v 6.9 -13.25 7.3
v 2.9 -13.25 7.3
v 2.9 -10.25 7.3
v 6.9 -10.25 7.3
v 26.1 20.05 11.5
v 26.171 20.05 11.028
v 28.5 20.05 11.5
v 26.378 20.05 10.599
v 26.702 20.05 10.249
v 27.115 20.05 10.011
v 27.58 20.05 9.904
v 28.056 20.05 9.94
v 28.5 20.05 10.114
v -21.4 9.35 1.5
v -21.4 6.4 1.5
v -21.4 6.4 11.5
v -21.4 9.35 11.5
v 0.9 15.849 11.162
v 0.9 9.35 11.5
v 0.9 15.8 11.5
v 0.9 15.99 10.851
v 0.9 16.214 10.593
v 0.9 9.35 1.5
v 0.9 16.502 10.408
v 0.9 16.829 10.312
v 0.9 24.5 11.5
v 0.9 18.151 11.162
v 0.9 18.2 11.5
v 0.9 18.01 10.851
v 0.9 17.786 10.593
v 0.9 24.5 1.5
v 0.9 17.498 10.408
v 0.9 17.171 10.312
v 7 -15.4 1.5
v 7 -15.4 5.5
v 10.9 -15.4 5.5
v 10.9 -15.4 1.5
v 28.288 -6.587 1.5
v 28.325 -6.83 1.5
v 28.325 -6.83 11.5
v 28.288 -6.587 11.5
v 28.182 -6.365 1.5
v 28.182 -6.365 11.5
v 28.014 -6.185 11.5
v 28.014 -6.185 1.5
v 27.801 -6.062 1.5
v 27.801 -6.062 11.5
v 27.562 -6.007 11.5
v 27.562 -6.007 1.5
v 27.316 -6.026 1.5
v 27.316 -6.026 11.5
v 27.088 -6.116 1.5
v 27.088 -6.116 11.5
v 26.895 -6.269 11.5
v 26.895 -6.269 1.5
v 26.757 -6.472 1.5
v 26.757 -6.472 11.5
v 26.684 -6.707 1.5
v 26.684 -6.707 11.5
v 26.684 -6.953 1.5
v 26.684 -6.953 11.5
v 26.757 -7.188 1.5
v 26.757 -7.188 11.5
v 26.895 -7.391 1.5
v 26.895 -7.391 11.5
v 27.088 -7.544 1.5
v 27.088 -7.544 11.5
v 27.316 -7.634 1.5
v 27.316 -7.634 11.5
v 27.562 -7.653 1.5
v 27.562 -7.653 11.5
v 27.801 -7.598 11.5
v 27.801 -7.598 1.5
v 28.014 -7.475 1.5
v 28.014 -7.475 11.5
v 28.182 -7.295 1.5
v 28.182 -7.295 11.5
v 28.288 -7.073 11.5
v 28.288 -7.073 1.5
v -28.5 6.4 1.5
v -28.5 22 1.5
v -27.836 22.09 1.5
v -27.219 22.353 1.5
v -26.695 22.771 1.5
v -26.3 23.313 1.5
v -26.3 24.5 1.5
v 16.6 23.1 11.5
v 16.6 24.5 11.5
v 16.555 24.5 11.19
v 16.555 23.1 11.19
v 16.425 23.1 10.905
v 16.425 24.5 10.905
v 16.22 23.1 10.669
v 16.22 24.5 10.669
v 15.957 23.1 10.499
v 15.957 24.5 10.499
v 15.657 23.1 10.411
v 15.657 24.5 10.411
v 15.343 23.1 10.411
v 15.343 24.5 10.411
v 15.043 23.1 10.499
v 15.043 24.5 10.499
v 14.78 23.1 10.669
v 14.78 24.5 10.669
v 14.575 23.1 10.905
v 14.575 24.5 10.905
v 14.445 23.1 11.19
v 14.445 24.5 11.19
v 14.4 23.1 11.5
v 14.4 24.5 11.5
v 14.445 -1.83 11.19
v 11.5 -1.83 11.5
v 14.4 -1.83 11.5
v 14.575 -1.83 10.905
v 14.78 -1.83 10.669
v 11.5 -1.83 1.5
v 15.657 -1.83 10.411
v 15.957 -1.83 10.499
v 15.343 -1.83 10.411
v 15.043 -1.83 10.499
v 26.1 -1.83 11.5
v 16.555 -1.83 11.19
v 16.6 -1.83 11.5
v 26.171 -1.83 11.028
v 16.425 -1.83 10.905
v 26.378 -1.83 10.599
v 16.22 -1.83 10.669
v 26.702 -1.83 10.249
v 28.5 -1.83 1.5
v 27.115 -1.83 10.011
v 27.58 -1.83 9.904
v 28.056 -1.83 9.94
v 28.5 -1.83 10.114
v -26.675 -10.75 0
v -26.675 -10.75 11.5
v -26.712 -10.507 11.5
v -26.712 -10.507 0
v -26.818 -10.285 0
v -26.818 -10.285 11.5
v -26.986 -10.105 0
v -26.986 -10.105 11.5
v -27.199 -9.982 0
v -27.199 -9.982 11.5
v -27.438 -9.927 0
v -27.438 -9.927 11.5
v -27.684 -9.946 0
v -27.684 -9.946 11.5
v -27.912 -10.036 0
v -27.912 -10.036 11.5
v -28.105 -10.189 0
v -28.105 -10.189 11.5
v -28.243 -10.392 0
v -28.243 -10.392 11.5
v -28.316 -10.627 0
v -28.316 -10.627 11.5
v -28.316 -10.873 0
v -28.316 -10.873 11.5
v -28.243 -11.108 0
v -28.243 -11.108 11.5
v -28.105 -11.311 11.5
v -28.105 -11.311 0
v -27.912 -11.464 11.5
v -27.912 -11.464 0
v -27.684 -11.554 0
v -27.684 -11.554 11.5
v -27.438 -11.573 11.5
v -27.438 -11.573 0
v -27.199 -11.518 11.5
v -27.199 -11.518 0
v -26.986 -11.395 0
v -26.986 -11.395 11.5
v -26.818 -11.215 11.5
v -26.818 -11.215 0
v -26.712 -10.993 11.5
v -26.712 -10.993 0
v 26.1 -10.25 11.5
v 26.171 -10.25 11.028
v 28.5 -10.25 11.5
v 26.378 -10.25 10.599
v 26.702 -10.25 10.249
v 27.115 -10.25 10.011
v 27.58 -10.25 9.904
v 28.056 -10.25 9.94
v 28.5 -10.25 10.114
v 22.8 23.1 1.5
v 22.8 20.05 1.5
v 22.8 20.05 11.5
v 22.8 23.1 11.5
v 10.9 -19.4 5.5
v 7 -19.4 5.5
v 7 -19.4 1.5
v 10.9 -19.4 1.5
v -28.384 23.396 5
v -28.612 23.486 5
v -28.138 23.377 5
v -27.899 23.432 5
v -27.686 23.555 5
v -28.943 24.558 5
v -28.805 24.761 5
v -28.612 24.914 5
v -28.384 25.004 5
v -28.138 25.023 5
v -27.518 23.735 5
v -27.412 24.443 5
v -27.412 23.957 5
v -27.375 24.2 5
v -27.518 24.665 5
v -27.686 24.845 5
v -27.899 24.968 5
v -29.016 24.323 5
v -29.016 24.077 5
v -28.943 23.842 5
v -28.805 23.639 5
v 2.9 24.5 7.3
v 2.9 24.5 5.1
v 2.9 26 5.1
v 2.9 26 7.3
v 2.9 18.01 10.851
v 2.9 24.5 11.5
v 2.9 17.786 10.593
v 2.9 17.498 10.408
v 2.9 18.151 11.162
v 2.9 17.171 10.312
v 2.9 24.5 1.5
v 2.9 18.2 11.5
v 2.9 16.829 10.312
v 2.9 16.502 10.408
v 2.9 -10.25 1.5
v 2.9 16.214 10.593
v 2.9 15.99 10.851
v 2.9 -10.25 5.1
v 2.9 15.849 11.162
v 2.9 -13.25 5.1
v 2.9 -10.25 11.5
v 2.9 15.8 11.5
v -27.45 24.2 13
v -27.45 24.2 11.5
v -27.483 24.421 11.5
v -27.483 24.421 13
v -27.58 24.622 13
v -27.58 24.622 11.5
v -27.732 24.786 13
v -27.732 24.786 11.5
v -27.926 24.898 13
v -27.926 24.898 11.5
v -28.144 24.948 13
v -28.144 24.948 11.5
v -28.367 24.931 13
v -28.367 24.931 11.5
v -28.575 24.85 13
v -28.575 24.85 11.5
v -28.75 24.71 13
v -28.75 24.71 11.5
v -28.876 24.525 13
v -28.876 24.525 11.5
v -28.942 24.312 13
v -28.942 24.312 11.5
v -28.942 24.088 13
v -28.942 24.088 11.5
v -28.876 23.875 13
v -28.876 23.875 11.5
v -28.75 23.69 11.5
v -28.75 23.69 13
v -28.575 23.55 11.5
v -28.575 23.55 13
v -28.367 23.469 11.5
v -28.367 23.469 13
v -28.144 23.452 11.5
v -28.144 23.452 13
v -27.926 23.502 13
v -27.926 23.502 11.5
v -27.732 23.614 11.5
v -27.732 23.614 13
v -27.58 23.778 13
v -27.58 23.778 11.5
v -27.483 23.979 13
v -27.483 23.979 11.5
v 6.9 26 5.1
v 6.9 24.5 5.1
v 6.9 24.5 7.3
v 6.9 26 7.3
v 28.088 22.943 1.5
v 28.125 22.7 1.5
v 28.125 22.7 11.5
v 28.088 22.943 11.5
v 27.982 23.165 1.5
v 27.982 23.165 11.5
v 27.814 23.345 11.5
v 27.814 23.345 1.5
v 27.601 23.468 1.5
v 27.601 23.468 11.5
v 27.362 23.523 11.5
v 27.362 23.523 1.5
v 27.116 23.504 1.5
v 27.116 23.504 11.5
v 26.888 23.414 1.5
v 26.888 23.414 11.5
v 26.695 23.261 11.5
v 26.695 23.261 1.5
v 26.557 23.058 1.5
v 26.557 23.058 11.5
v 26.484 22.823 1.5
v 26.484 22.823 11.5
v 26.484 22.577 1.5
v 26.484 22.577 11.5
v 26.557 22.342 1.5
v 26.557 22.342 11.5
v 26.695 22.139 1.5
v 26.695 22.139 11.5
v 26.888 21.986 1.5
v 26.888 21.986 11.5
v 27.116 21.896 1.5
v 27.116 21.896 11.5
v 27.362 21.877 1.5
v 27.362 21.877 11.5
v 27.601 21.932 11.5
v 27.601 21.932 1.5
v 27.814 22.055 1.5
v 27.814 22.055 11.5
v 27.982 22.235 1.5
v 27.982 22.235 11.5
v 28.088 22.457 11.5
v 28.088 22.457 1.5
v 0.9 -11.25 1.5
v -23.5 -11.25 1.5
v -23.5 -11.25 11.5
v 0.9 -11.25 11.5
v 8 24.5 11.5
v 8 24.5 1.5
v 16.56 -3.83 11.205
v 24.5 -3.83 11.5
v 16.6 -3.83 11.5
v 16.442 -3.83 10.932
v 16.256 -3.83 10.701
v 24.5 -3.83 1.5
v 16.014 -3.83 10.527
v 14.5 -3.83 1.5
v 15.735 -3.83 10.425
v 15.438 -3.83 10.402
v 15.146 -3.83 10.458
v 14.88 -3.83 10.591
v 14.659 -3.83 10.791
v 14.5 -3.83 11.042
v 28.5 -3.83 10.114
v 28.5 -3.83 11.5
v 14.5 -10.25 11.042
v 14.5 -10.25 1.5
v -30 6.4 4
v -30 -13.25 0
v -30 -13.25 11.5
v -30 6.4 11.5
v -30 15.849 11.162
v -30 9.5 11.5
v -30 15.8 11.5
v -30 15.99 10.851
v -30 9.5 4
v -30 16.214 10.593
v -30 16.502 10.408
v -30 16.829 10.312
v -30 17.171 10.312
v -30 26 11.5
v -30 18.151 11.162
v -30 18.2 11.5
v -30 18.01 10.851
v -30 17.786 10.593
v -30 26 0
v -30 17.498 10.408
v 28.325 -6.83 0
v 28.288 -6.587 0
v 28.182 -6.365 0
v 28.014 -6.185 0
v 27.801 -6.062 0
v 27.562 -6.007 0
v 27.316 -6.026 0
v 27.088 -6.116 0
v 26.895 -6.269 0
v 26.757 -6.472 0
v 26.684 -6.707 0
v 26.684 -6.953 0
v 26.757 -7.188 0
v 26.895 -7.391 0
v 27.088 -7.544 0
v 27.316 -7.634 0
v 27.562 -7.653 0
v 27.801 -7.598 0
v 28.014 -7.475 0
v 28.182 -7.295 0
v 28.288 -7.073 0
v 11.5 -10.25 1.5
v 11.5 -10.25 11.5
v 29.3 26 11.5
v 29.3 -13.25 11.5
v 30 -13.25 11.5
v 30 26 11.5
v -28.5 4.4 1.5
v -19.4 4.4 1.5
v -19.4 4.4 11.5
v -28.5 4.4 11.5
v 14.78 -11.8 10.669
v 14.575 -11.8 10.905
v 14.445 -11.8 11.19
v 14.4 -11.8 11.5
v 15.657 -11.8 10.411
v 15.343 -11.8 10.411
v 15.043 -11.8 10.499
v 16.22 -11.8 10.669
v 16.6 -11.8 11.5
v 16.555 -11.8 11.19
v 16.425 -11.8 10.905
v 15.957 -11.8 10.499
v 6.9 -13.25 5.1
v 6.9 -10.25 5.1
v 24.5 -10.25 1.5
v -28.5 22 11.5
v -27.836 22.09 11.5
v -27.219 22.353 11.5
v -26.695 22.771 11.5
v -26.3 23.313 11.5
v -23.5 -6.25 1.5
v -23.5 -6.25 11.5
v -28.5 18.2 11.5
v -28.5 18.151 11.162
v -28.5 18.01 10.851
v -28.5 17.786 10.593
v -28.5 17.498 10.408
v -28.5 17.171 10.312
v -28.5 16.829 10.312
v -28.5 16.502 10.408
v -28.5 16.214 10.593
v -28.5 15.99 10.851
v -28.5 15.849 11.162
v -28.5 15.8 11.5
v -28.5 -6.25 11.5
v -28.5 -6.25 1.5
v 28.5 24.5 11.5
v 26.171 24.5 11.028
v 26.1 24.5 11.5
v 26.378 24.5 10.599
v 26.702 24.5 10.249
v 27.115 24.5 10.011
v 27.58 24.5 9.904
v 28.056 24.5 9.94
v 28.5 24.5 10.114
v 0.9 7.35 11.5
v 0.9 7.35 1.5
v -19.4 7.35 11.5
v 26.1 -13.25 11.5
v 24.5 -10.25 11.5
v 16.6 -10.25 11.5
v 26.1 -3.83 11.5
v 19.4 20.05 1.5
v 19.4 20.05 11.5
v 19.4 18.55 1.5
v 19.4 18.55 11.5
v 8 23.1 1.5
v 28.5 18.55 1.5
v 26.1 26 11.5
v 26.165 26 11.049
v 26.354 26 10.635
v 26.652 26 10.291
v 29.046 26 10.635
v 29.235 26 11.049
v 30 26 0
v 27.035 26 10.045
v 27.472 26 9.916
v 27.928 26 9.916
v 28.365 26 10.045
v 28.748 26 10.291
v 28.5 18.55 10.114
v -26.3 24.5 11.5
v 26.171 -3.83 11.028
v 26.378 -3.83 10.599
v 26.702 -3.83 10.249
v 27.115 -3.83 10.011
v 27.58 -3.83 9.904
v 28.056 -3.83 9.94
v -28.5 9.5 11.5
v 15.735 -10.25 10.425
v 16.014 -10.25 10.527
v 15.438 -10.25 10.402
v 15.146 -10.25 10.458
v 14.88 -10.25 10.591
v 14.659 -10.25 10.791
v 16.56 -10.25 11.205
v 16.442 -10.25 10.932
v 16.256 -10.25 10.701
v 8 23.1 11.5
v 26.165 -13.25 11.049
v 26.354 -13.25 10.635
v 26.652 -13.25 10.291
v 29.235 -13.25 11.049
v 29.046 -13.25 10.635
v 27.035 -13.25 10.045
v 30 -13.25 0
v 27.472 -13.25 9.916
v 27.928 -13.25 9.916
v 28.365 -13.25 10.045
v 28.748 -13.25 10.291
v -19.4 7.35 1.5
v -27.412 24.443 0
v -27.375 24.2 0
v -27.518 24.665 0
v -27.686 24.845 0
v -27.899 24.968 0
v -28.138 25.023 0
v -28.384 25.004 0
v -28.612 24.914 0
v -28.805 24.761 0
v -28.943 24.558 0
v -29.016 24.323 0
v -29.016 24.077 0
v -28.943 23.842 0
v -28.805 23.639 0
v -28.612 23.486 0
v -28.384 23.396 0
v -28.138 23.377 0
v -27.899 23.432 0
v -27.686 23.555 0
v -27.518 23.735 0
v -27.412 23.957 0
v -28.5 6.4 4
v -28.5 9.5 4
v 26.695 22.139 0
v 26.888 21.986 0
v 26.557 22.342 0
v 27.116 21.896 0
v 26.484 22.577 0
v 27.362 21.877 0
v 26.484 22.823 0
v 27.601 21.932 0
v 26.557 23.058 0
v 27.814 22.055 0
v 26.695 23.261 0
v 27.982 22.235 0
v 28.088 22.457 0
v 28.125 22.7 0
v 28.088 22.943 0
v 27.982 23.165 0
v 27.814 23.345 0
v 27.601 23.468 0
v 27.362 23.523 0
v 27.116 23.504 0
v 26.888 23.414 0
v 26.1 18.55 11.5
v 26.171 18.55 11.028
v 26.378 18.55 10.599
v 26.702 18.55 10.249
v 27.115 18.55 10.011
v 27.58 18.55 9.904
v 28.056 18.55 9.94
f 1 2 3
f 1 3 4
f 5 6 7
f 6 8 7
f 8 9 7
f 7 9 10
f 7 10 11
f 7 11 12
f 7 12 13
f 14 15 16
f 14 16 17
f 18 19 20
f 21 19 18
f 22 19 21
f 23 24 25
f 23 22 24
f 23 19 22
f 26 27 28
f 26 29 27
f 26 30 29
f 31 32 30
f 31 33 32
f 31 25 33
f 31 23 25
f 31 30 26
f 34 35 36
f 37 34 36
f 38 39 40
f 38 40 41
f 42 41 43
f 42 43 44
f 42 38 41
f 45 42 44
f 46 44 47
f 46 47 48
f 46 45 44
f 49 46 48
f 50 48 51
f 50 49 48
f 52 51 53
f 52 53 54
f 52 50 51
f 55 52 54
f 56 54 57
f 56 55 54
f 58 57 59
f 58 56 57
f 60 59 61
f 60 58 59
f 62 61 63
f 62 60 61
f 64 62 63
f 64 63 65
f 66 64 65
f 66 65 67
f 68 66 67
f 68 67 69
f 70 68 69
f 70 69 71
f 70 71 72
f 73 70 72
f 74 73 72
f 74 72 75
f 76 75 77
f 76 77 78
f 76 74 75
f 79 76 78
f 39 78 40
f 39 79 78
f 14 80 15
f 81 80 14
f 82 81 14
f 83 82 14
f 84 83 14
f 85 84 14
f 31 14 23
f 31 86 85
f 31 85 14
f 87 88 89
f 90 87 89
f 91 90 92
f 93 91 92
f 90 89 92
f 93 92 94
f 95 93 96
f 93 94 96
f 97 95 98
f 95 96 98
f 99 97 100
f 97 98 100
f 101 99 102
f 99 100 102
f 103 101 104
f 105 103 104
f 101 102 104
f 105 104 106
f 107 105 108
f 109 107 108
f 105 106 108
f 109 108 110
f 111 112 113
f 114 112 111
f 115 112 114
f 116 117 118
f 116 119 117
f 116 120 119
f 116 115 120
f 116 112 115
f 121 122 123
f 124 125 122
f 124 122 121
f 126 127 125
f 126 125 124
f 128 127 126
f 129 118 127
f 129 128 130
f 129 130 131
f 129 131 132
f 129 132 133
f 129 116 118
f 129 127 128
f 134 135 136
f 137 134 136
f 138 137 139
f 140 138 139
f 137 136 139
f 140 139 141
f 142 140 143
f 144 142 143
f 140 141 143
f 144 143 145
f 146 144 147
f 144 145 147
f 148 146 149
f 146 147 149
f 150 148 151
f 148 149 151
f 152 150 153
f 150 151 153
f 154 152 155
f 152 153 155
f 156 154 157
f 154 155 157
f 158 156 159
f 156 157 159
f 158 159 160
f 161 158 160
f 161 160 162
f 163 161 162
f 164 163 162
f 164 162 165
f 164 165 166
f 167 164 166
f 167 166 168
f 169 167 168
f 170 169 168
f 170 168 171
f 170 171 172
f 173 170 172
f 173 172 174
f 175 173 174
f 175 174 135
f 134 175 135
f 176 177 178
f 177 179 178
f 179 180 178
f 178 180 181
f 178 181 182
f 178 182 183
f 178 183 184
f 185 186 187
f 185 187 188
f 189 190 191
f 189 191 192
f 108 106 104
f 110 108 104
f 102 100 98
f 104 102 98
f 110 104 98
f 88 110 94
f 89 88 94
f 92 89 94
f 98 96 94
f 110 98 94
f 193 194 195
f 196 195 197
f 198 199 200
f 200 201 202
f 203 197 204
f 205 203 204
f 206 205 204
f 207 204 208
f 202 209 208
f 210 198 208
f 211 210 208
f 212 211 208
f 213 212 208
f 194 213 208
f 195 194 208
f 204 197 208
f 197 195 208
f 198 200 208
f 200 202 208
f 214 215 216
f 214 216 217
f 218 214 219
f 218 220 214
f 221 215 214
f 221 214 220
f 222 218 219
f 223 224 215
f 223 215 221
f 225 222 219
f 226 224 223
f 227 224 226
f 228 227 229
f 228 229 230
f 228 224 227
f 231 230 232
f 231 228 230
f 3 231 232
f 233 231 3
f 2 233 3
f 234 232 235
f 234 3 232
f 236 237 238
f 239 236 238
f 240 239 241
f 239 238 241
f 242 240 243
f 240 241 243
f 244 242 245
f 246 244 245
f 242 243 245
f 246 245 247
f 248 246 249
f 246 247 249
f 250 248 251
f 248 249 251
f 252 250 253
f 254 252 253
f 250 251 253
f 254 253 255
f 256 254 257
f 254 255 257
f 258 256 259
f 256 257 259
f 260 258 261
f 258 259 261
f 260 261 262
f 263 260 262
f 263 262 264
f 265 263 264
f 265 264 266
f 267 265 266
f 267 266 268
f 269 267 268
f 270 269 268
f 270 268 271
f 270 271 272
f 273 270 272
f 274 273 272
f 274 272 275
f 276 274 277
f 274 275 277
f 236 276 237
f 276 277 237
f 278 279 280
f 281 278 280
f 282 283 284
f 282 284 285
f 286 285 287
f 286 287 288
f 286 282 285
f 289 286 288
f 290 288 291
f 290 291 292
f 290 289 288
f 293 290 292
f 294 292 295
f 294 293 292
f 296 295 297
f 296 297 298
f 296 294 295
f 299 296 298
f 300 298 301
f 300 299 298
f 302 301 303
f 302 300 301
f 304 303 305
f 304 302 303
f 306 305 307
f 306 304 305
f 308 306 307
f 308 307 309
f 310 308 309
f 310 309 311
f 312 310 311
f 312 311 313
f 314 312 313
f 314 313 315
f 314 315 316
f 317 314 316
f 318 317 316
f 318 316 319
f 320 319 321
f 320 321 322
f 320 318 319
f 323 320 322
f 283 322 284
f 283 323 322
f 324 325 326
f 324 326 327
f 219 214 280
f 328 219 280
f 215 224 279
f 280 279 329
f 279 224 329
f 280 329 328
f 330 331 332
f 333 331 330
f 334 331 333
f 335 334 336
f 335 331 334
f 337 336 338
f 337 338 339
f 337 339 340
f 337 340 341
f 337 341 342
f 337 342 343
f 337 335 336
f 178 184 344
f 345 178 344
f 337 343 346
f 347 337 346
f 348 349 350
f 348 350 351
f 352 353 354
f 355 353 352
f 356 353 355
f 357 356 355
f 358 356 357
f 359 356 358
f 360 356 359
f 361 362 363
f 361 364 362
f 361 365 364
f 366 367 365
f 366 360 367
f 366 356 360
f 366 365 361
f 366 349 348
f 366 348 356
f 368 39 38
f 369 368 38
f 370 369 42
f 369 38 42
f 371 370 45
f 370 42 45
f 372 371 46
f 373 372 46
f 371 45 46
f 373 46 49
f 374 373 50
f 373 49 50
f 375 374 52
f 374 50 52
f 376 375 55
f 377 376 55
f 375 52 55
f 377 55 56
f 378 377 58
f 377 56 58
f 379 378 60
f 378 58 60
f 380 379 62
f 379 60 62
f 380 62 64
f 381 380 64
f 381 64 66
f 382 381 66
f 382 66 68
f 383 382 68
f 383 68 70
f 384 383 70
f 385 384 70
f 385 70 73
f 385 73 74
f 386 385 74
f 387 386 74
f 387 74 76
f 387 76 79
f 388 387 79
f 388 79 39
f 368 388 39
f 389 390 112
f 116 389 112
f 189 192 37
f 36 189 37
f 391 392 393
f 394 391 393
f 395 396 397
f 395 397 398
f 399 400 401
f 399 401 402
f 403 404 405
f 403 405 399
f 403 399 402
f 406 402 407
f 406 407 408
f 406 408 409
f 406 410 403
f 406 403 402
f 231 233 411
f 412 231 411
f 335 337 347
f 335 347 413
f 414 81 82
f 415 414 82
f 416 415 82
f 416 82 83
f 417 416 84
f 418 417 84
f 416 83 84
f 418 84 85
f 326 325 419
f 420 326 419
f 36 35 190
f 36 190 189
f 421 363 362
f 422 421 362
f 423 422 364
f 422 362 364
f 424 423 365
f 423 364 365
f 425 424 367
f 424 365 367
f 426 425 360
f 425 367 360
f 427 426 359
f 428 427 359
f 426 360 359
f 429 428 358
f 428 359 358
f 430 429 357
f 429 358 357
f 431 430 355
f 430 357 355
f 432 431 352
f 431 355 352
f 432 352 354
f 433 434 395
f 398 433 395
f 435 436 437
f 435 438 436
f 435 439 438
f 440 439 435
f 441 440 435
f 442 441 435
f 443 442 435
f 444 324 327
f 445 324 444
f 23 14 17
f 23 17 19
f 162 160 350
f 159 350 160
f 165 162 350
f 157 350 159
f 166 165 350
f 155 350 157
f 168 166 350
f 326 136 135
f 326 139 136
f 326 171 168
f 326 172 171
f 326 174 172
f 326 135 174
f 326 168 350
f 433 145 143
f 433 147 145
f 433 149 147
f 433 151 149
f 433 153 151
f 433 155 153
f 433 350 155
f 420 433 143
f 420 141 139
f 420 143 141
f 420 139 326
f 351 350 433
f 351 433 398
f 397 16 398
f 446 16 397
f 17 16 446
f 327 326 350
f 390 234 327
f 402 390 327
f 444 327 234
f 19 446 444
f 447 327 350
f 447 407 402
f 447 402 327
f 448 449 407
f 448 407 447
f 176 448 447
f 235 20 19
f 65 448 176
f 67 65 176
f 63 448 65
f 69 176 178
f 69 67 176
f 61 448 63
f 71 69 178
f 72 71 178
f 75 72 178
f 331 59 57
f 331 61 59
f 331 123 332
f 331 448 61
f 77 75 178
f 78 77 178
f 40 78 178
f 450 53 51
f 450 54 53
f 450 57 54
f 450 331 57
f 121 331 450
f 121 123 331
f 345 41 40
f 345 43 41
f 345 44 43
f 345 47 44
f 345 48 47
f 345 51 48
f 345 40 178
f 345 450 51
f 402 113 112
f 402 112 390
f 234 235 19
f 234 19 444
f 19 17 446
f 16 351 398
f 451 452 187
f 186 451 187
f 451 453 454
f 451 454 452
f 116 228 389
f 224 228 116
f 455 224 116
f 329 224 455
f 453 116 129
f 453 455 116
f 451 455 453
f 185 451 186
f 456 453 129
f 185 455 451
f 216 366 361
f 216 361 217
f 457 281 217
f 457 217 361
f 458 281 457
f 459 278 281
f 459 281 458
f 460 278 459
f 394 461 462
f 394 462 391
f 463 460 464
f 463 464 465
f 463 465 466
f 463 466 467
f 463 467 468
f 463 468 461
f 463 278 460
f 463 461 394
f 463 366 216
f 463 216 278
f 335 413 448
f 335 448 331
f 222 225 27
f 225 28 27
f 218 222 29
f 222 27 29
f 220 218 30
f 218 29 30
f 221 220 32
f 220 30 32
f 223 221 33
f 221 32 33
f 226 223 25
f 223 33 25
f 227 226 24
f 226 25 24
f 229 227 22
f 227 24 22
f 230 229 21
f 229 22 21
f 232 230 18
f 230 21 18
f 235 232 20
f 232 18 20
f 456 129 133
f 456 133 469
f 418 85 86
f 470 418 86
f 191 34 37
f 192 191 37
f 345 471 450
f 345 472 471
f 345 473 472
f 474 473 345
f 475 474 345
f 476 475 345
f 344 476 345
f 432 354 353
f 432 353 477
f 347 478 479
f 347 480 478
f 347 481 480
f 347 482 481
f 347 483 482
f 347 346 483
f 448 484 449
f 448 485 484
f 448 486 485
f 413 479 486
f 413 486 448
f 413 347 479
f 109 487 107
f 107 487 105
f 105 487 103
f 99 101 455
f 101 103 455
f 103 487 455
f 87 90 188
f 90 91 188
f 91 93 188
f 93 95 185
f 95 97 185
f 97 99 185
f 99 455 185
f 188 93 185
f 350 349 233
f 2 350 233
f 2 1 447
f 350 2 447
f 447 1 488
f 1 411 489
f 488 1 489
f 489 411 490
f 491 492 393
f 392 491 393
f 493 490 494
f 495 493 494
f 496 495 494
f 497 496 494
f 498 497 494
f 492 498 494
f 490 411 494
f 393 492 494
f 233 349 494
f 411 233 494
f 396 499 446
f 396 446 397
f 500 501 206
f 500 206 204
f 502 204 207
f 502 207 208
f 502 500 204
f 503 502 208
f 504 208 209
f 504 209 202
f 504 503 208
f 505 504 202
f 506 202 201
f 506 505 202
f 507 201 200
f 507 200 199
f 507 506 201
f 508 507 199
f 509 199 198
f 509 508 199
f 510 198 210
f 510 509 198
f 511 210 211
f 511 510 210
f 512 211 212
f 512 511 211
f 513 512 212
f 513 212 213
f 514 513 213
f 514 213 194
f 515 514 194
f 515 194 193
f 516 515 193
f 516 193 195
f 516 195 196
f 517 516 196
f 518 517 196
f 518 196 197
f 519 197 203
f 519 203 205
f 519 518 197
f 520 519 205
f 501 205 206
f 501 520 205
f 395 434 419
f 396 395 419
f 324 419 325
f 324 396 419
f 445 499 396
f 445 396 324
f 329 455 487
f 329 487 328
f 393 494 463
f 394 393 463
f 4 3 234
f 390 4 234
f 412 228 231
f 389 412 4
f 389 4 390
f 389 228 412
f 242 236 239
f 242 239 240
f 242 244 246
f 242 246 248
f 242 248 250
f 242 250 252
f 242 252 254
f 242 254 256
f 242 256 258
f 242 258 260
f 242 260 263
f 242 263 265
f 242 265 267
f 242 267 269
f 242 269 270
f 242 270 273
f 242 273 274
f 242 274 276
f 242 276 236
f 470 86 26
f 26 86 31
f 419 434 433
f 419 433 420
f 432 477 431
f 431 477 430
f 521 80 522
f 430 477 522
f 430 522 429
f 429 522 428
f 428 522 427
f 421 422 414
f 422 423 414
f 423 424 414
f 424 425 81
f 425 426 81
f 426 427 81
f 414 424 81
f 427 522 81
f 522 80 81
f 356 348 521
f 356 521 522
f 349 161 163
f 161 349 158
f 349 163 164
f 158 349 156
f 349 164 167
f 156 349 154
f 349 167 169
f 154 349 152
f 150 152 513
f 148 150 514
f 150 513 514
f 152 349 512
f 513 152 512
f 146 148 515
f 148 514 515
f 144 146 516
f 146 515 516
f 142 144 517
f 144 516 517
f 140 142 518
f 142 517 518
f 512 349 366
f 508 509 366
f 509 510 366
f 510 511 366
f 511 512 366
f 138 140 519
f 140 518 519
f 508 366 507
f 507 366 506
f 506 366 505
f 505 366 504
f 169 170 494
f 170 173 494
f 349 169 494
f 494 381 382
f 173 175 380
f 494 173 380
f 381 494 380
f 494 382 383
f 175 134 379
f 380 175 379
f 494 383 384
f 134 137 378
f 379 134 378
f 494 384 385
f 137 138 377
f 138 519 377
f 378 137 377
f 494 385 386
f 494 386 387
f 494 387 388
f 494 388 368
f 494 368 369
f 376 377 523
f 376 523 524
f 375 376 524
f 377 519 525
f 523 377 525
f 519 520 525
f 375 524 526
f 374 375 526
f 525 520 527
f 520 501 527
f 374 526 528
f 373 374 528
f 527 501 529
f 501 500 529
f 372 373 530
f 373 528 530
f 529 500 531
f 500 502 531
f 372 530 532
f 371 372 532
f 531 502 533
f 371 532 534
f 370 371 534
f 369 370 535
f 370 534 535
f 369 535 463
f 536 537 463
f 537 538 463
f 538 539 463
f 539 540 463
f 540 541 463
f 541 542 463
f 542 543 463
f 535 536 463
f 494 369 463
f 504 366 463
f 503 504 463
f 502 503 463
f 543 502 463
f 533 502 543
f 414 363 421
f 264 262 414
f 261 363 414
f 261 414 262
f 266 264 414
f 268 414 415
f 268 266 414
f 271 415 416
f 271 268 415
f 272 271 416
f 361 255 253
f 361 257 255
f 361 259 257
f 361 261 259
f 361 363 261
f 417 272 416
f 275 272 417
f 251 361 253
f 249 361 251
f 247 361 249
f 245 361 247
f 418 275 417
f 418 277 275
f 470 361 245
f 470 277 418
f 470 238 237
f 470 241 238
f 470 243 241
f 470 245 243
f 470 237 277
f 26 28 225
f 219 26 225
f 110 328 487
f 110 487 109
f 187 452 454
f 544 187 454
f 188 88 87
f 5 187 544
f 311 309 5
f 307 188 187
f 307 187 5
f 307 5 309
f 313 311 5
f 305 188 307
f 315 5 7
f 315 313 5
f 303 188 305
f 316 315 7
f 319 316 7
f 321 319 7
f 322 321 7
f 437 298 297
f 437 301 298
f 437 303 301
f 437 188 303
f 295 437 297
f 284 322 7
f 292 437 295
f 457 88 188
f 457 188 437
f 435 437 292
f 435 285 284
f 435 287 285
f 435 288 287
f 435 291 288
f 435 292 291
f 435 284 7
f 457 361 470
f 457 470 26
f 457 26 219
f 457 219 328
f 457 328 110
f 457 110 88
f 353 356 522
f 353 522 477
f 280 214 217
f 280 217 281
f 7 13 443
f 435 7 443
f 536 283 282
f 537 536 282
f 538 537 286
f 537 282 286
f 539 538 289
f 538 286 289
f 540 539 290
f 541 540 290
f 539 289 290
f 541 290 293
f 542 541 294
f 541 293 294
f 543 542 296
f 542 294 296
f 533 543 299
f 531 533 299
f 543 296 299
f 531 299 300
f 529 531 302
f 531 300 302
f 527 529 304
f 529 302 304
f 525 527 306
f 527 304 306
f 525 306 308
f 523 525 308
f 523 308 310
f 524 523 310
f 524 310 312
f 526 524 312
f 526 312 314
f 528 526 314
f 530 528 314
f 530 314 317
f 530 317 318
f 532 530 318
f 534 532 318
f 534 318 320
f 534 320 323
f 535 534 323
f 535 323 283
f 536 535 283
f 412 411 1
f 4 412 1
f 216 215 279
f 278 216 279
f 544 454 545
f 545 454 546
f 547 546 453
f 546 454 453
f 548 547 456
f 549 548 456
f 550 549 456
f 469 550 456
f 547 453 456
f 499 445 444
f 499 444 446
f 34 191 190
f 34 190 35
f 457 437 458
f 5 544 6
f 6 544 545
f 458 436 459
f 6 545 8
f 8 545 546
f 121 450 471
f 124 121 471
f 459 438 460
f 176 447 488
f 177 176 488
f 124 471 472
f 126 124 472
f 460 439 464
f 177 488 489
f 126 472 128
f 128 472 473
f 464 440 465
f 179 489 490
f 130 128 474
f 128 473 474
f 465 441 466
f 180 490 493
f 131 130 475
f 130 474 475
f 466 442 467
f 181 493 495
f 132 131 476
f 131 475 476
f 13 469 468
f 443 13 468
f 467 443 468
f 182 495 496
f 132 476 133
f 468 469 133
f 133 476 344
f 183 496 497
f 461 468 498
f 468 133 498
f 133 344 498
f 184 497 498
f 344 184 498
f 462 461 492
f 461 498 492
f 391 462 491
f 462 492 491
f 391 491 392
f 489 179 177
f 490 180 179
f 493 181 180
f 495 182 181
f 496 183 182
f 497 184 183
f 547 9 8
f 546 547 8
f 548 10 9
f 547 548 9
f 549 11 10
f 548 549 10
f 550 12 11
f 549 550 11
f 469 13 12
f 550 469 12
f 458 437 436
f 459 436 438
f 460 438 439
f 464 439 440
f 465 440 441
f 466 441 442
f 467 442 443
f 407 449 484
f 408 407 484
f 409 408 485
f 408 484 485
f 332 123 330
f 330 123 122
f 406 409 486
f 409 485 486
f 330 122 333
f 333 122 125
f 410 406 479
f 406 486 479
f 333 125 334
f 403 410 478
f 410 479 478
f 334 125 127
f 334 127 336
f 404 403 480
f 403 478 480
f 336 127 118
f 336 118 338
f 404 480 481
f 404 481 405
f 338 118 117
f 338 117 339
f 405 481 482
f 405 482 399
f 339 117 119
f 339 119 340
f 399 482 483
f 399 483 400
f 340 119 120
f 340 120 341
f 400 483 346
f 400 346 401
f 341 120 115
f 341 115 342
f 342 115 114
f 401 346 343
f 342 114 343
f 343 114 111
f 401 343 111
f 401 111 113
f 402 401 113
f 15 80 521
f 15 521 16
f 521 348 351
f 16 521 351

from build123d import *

# Parameters (mm, degrees)
SKETCH_1_W                      = 60
SKETCH_1_H                      = 52
EXTRUDE_1_DEPTH                 = 11.5
SHELL_1_T                       = -1.5
SKETCH_2_W                      = 15
SKETCH_2_H                      = 1.4
SKETCH_2_W_2                    = 9.1
SKETCH_2_H_2                    = 1.5
EXTRUDE_2_DEPTH                 = 10
CUT_EXTRUDE_1_REACH             = 63.125
SKETCH_3_W                      = 4
SKETCH_3_H                      = 2.2
SKETCH_4_R                      = 1.6
F_3MM_2_DEPTH                   = 62.124872188
F_2MM_4_START                   = -1.5
SKETCH_6_R                      = 1.1
F_2MM_4_DEPTH                   = 36.3
CUT_EXTRUDE_5_REACH             = 68.395
SKETCH_8_W                      = 7.5
SKETCH_8_H                      = 3.1
SKETCH_9_W                      = 5
SKETCH_9_H                      = 5
SKETCH_9_W_2                    = 5.7
SKETCH_9_H_2                    = 4.45
SKETCH_9_R                      = 0.825
SKETCH_9_W_3                    = 4
SKETCH_9_H_3                    = 6.42
EXTRUDE_4_DEPTH                 = 10
SKETCH_10_R                     = 0.75
EXTRUDE_5_DEPTH                 = 1.5
SKETCH_11_W                     = 3.9
SKETCH_11_H                     = 4
EXTRUDE_6_DEPTH                 = 4
CUT_EXTRUDE_1_2_REACH           = 43.331
SKETCH_13_R                     = 0.825
CUT_EXTRUDE_2_REACH             = 43.331
SKETCH_14_W                     = 60
SKETCH_14_H                     = 12.75
CUT_EXTRUDE_2_DIRECTION_2_REACH = 43.331
CUT_EXTRUDE_START               = -11.5
SKETCH_15_R                     = 0.825
CUT_EXTRUDE_3_DEPTH             = 5
SKETCH_16_R                     = 1.2
CUT_EXTRUDE_4_DEPTH             = 40


with BuildPart() as part:
    # 草图1 → 凸台-拉伸1 (new body)
    with BuildSketch(Plane.XY):
        Rectangle(SKETCH_1_W, SKETCH_1_H)
    extrude(amount=EXTRUDE_1_DEPTH)

    # 抽壳1
    shell_1_openings = [part.faces().sort_by_distance(p)[0] for p in [
        (0, 0, 11.5),
    ]]
    offset(amount=SHELL_1_T, openings=shell_1_openings, kind=Kind.INTERSECTION)

    # 草图2 → 凸台-拉伸2 (add)
    with BuildSketch(Plane.XY.offset(1.5)):
        Polygon((-21.4, 9.35), (0.9, 9.35), (0.9, 24.5), (2.9, 24.5), (2.9, -10.25), (11.5, -10.25), (11.5, -1.83), (28.5, -1.83), (28.5, -3.83), (14.5, -3.83), (14.5, -10.25), (28.5, -10.25), (28.5, -13.25), (-4.1, -13.25), (-28.5, -13.25), (-28.5, -11.25), (0.9, -11.25), (0.9, 7.35), (-19.4, 7.35), (-19.4, 4.4), (-28.5, 4.4), (-28.5, 6.4), (-21.4, 6.4), align=None)
        with Locations((15.5, 23.8)):
            Rectangle(SKETCH_2_W, SKETCH_2_H)
        with Locations((23.95, 19.3)):
            Rectangle(SKETCH_2_W_2, SKETCH_2_H_2)
    extrude(amount=EXTRUDE_2_DEPTH)

    # Cut-Extrude 1: up to this face of the body (flat: up to its plane)
    cut_extrude_1_end = Plane(part.part.faces().sort_by_distance((0, 26, 5.75))[0])
    # 草图3 → Cut-Extrude 1 (cut, up to the picked face)
    with BuildSketch(Plane.XZ.offset(26), mode=Mode.PRIVATE) as cut_extrude_1_sk1:
        with Locations((4.9, 6.2)):
            Rectangle(SKETCH_3_W, SKETCH_3_H)
    cut_extrude_1_tool1 = split(extrude(cut_extrude_1_sk1.sketch, amount=-CUT_EXTRUDE_1_REACH, mode=Mode.PRIVATE), bisect_by=cut_extrude_1_end, keep=Keep.BOTH, mode=Mode.PRIVATE)
    add(cut_extrude_1_tool1.solids().sort_by(Axis((4.9, -26, 6.2), (0, 1, 0)))[0], mode=Mode.SUBTRACT)

    # 草图4 → 3MM孔切除-拉伸2 (cut, through all)
    with BuildSketch(Plane.XZ.offset(26)):
        with Locations((27.7, 11.5)):
            Circle(SKETCH_4_R)
    extrude(amount=-F_3MM_2_DEPTH, mode=Mode.SUBTRACT)

    # 草图6 → 2mm孔切除-拉伸4 (cut)
    with BuildSketch(Plane(origin=(0, 26, 0), x_dir=(1, 0, 0), z_dir=(0, 1, 0)).offset(F_2MM_4_START)):
        with Locations((15.5, -11.5)):
            Circle(SKETCH_6_R)
    extrude(amount=-F_2MM_4_DEPTH, mode=Mode.SUBTRACT)

    # 草图8 → 电机线切除-拉伸5 (cut, up to next)
    with BuildSketch(Plane.ZY.offset(30), mode=Mode.PRIVATE) as cut_extrude_5_sk1:
        with Locations((7.75, 7.95)):
            Rectangle(SKETCH_8_W, SKETCH_8_H)
    cut_extrude_5_tool1 = extrude(cut_extrude_5_sk1.sketch, amount=-CUT_EXTRUDE_5_REACH, mode=Mode.PRIVATE) & part.part
    add(cut_extrude_5_tool1.solids().sort_by_distance((-30, 7.95, 7.75))[0], mode=Mode.SUBTRACT)

    # 草图9 → 螺柱支撑凸台-拉伸4 (add)
    # profile 1 of 4: a face of its own
    with BuildSketch(Plane.XY.offset(1.5)):
        with Locations((-26, -8.75)):
            Rectangle(SKETCH_9_W, SKETCH_9_H)
    # profile 2 of 4: a face of its own
    with BuildSketch(Plane.XY.offset(1.5)):
        with Locations((25.65, 22.275)):
            Rectangle(SKETCH_9_W_2, SKETCH_9_H_2)
        with Locations((27.3, 22.7)):
            Circle(SKETCH_9_R, mode=Mode.SUBTRACT)
    # profile 3 of 4: a face of its own
    with BuildSketch(Plane.XY.offset(1.5)):
        with BuildLine():
            Line((-28.5, 24.5), (-28.5, 22))
            ThreePointArc((-28.5, 22), (-27.219099052, 22.353073648), (-26.3, 23.312565791))
            Line((-26.3, 23.312565791), (-26.3, 24.5))
            Line((-26.3, 24.5), (-28.5, 24.5))
        make_face()
    # profile 4 of 4: a face of its own
    with BuildSketch(Plane.XY.offset(1.5)):
        with Locations((26.5, -7.04)):
            Rectangle(SKETCH_9_W_3, SKETCH_9_H_3)
        with Locations((27.5, -6.83)):
            Circle(SKETCH_9_R, mode=Mode.SUBTRACT)
    extrude(amount=EXTRUDE_4_DEPTH)

    # 草图10 → 上下楔凸台-拉伸5 (add)
    with BuildSketch(Plane.XY.offset(11.5)):
        with Locations((-28.2, 24.2)):
            Circle(SKETCH_10_R)
    extrude(amount=EXTRUDE_5_DEPTH)

    # 草图11 → 变速卡位凸台-拉伸6 (add)
    with BuildSketch(Plane.XY.offset(1.5)):
        with Locations((8.95, -17.4)):
            Rectangle(SKETCH_11_W, SKETCH_11_H)
    extrude(amount=EXTRUDE_6_DEPTH)

    # 草图13 → Cut-Extrude 1 2 (cut, up to next)
    with BuildSketch(Plane.XY.offset(11.5), mode=Mode.PRIVATE) as cut_extrude_1_2_sk1:
        with Locations((-27.5, -10.75)):
            Circle(SKETCH_13_R)
    cut_extrude_1_2_tool1 = extrude(cut_extrude_1_2_sk1.sketch, amount=-CUT_EXTRUDE_1_2_REACH, mode=Mode.PRIVATE) & part.part
    # 草图13 → Cut-Extrude 1 2 (cut, up to next)
    with BuildSketch(Plane.XY.offset(11.5), mode=Mode.PRIVATE) as cut_extrude_1_2_sk2:
        with Locations((27.3, 22.7)):
            Circle(SKETCH_13_R)
    cut_extrude_1_2_tool2 = extrude(cut_extrude_1_2_sk2.sketch, amount=-CUT_EXTRUDE_1_2_REACH, mode=Mode.PRIVATE) & part.part
    # 草图13 → Cut-Extrude 1 2 (cut, up to next)
    with BuildSketch(Plane.XY.offset(11.5), mode=Mode.PRIVATE) as cut_extrude_1_2_sk3:
        with Locations((27.5, -6.83)):
            Circle(SKETCH_13_R)
    cut_extrude_1_2_tool3 = extrude(cut_extrude_1_2_sk3.sketch, amount=-CUT_EXTRUDE_1_2_REACH, mode=Mode.PRIVATE) & part.part
    add(cut_extrude_1_2_tool1.solids().sort_by_distance((-27.5, -10.75, 11.5))[0], mode=Mode.SUBTRACT)
    add(cut_extrude_1_2_tool2.solids().sort_by_distance((27.3, 22.7, 11.5))[0], mode=Mode.SUBTRACT)
    add(cut_extrude_1_2_tool3.solids().sort_by_distance((27.5, -6.83, 11.5))[0], mode=Mode.SUBTRACT)

    # 草图14 → 切除-拉伸2 (cut, up to next)
    with BuildSketch(Plane.XY.offset(1.5), mode=Mode.PRIVATE) as cut_extrude_2_sk1:
        with Locations((0, -19.625)):
            Rectangle(SKETCH_14_W, SKETCH_14_H)
    cut_extrude_2_tool1 = extrude(cut_extrude_2_sk1.sketch, amount=CUT_EXTRUDE_2_REACH, mode=Mode.PRIVATE) & part.part
    add(cut_extrude_2_tool1.solids().sort_by_distance((0, -19.625, 1.5))[0], mode=Mode.SUBTRACT)

    # 草图14 → 切除-拉伸2 direction 2 (cut, up to next)
    with BuildSketch(Plane.XY.offset(1.5), mode=Mode.PRIVATE) as cut_extrude_2_direction_2_sk1:
        with Locations((0, -19.625)):
            Rectangle(SKETCH_14_W, SKETCH_14_H)
    cut_extrude_2_direction_2_tool1 = extrude(cut_extrude_2_direction_2_sk1.sketch, amount=-CUT_EXTRUDE_2_DIRECTION_2_REACH, mode=Mode.PRIVATE) & part.part
    add(cut_extrude_2_direction_2_tool1.solids().sort_by_distance((0, -19.625, 1.5))[0], mode=Mode.SUBTRACT)


with BuildPart() as cut_extrude_2_piece_1:
    # of the separate pieces the step leaves, piece 1, a body of its own (cut_extrude_2_pieces)
    add(part.part.solids().sort_by_distance((-30, 26, 0))[0])

    # 草图15 → 切除-拉伸3 (cut)
    with BuildSketch(Plane.XY.offset(11.5).offset(CUT_EXTRUDE_START)):
        with Locations((-28.2, 24.2)):
            Circle(SKETCH_15_R)
    extrude(amount=CUT_EXTRUDE_3_DEPTH, mode=Mode.SUBTRACT)

    # 草图16 → 切除-拉伸4 (cut)
    with BuildSketch(Plane.ZY.offset(30)):
        with Locations((11.5, 17)):
            Circle(SKETCH_16_R)
    extrude(amount=-CUT_EXTRUDE_4_DEPTH, mode=Mode.SUBTRACT)


with BuildPart() as cut_extrude_2_piece_2:
    # of the separate pieces the step leaves, piece 2, a body of its own (cut_extrude_2_pieces)
    add(part.part.solids().sort_by_distance((7, -15.4, 1.5))[0])


solid = Compound([cut_extrude_2_piece_1.part, cut_extrude_2_piece_2.part])
